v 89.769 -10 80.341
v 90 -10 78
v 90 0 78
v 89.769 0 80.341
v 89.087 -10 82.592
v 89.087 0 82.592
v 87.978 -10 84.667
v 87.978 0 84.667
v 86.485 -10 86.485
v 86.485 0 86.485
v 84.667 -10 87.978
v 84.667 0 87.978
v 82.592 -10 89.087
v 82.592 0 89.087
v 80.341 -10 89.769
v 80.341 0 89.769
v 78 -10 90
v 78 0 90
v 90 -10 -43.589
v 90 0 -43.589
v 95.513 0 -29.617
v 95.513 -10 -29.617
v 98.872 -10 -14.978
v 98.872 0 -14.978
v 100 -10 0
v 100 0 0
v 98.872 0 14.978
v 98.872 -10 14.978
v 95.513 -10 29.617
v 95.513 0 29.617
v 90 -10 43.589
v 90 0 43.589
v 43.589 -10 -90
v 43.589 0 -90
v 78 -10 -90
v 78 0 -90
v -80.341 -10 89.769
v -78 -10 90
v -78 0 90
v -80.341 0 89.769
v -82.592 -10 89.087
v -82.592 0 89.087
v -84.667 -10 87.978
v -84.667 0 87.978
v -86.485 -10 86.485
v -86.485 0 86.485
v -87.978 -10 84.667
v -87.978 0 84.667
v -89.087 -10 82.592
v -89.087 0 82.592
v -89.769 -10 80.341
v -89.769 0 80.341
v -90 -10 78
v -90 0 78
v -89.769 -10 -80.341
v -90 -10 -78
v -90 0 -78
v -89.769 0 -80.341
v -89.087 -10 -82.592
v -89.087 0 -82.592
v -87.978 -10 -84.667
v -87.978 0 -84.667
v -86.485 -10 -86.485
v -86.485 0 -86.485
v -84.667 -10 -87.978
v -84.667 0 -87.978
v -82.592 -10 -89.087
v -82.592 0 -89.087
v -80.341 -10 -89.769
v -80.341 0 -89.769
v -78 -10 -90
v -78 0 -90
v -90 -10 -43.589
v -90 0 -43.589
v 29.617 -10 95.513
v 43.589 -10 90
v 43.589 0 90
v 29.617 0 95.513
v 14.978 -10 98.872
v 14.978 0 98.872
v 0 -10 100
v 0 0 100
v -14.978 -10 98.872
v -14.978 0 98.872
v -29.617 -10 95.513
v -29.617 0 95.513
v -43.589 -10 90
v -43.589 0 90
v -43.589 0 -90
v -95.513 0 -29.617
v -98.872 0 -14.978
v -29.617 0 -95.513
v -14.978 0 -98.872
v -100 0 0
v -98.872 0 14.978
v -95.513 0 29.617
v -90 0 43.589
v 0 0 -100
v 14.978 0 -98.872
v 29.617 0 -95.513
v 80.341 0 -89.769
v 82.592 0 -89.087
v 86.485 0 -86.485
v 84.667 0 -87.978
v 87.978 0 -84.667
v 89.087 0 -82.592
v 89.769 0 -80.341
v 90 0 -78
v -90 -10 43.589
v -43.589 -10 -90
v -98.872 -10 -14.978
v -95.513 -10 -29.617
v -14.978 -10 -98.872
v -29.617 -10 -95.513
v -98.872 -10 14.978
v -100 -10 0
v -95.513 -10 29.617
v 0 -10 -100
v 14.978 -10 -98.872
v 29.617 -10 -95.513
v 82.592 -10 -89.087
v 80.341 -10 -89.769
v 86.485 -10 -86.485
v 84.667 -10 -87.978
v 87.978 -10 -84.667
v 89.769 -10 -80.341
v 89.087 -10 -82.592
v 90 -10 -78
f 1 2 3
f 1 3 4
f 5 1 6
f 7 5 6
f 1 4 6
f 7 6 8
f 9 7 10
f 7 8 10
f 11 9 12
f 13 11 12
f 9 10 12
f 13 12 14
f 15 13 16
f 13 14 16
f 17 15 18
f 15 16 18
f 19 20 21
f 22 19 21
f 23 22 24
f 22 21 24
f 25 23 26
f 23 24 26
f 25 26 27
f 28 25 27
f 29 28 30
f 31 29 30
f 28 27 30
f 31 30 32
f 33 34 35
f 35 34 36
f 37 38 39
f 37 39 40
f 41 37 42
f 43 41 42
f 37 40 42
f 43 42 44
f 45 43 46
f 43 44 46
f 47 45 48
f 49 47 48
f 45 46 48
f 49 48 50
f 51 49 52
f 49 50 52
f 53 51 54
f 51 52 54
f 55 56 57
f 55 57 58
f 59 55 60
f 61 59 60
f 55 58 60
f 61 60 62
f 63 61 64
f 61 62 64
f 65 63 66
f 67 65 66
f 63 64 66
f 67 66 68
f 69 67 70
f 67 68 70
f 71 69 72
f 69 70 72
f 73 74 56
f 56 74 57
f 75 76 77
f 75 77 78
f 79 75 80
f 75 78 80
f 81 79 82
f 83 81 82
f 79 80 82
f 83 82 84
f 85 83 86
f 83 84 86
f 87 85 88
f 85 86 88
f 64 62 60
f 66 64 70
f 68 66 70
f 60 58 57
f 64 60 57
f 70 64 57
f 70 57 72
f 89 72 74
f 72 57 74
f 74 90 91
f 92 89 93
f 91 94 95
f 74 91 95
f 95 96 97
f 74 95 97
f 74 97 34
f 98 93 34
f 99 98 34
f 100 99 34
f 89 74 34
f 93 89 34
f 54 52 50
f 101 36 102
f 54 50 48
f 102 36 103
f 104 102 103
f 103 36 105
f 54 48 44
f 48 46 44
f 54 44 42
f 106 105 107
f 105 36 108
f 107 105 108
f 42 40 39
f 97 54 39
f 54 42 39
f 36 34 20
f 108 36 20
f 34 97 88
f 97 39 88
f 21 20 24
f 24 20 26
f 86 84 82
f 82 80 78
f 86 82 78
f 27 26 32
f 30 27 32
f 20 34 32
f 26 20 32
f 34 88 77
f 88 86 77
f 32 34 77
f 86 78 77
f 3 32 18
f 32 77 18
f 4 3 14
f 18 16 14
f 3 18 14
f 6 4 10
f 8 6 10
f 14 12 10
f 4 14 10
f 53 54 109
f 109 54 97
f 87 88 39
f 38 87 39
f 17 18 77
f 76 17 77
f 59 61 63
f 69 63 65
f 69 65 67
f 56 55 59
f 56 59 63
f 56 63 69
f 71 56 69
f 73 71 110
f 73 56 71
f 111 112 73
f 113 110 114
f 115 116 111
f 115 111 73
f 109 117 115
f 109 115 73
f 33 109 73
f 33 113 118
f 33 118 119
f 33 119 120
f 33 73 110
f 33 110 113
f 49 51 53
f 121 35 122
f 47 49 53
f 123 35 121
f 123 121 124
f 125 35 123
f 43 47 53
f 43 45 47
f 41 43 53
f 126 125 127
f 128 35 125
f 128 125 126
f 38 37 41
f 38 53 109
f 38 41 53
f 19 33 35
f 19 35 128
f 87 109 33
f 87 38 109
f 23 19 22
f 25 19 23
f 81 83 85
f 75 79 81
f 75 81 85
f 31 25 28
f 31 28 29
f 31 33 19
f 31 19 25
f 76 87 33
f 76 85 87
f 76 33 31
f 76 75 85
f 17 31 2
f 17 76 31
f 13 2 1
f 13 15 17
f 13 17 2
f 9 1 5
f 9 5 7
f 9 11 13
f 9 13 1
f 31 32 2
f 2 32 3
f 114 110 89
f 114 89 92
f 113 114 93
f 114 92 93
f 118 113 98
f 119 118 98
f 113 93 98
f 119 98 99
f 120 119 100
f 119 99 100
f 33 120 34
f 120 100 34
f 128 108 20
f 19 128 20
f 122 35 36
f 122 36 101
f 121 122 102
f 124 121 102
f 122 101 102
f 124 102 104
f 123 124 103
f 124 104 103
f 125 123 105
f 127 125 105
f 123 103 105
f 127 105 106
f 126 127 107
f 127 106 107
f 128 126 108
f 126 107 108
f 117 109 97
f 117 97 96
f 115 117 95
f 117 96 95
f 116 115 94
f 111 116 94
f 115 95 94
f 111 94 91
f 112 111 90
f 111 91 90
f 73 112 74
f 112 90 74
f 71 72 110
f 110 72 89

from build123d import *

# Parameters (mm, degrees)
F1_DEPTH = 10


with BuildPart() as f1:
    # F0 (on Front) → F1 (new body)
    with BuildSketch(Plane.XZ):
        with BuildLine():
            ThreePointArc((-90, 43.5889894354), (-70.7106781187, 70.7106781187), (-43.5889894354, 90))
            Line((-43.5889894354, 90), (-78, 90))
            ThreePointArc((-78, 90), (-86.4852813742, 86.4852813742), (-90, 78))
            Line((-90, 78), (-90, 43.5889894354))
        make_face()
        with BuildLine():
            Line((-43.5889894354, 90), (43.5889894354, 90))
            ThreePointArc((43.5889894354, 90), (0, 100), (-43.5889894354, 90))
        make_face()
        with BuildLine():
            ThreePointArc((43.5889894354, 90), (70.7106781187, 70.7106781187), (90, 43.5889894354))
            Line((90, 43.5889894354), (90, 78))
            ThreePointArc((90, 78), (86.4852813742, 86.4852813742), (78, 90))
            Line((78, 90), (43.5889894354, 90))
        make_face()
        with BuildLine():
            Line((90, -78), (90, -43.5889894354))
            ThreePointArc((90, -43.5889894354), (70.7106781187, -70.7106781187), (43.5889894354, -90))
            Line((43.5889894354, -90), (78, -90))
            ThreePointArc((78, -90), (86.4852813742, -86.4852813742), (90, -78))
        make_face()
        with BuildLine():
            Line((-78, -90), (-43.5889894354, -90))
            ThreePointArc((-43.5889894354, -90), (-70.7106781187, -70.7106781187), (-90, -43.5889894354))
            Line((-90, -43.5889894354), (-90, -78))
            ThreePointArc((-90, -78), (-86.4852813742, -86.4852813742), (-78, -90))
        make_face()
        with BuildLine():
            Line((90, -43.5889894354), (90, 43.5889894354))
            ThreePointArc((90, 43.5889894354), (70.7106781187, 70.7106781187), (43.5889894354, 90))
            Line((43.5889894354, 90), (-43.5889894354, 90))
            ThreePointArc((-43.5889894354, 90), (-70.7106781187, 70.7106781187), (-90, 43.5889894354))
            Line((-90, 43.5889894354), (-90, -43.5889894354))
            ThreePointArc((-90, -43.5889894354), (-70.7106781187, -70.7106781187), (-43.5889894354, -90))
            Line((-43.5889894354, -90), (43.5889894354, -90))
            ThreePointArc((43.5889894354, -90), (70.7106781187, -70.7106781187), (90, -43.5889894354))
        make_face()
        with BuildLine():
            Line((-90, -43.5889894354), (-90, 43.5889894354))
            ThreePointArc((-90, 43.5889894354), (-100, 0), (-90, -43.5889894354))
        make_face()
        with BuildLine():
            ThreePointArc((-43.5889894354, -90), (0, -100), (43.5889894354, -90))
            Line((43.5889894354, -90), (-43.5889894354, -90))
        make_face()
        with BuildLine():
            ThreePointArc((90, -43.5889894354), (97.4679434481, -22.360679775), (100, 0))
            ThreePointArc((100, 0), (97.4679434481, 22.360679775), (90, 43.5889894354))
            Line((90, 43.5889894354), (90, -43.5889894354))
        make_face()
    extrude(amount=F1_DEPTH)


solid = f1.part
